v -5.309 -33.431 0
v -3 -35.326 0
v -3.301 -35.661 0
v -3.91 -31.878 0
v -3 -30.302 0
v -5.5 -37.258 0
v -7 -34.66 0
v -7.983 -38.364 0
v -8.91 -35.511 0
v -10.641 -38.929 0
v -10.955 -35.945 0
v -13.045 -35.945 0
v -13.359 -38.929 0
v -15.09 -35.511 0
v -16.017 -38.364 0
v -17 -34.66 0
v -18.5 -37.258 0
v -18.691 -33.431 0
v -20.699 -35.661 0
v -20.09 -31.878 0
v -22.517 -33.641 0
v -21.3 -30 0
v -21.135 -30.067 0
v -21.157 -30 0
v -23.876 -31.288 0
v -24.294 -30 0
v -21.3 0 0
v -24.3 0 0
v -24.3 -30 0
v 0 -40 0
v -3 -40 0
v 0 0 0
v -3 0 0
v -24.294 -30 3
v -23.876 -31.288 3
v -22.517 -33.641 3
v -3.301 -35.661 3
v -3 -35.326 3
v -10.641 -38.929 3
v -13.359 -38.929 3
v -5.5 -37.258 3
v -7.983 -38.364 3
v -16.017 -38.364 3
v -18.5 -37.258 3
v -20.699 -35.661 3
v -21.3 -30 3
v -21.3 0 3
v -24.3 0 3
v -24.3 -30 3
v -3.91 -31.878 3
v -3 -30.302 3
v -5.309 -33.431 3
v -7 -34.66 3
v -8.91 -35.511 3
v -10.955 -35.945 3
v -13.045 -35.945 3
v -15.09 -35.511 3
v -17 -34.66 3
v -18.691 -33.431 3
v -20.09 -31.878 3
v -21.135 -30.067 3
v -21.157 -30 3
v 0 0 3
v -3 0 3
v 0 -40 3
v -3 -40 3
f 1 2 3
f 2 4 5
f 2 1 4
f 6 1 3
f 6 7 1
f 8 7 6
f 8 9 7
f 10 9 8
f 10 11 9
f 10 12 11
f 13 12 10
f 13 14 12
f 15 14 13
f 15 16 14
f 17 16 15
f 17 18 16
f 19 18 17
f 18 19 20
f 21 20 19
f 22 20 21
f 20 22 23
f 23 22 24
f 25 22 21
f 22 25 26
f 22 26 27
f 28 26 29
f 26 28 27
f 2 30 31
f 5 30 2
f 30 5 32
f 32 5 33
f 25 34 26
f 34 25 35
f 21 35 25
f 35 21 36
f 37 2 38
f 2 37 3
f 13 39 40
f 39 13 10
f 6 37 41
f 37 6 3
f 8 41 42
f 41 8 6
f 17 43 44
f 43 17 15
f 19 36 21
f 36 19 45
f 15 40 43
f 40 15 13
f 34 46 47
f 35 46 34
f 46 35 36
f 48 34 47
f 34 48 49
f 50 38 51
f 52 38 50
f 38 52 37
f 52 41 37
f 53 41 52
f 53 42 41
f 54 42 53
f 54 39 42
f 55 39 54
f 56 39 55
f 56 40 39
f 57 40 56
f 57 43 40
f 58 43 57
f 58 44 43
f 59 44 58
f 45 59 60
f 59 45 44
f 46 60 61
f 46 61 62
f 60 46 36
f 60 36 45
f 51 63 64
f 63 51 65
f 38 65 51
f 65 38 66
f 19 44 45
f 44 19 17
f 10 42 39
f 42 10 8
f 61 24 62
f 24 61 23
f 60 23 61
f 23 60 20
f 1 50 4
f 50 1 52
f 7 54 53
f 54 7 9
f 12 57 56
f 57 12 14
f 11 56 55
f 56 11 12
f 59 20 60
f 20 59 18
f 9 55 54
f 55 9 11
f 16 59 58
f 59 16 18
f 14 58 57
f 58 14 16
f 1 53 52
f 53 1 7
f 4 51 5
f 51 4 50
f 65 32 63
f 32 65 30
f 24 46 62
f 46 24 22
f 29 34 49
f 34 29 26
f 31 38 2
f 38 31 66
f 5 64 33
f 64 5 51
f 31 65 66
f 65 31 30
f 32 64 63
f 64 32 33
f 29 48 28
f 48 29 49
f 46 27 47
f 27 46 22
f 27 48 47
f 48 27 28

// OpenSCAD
//u
rotate([0,0,180]){
union(){
cube([3,40,3]);
difference(){  
  translate([12,26,0]) cylinder(3,13,13);
  translate([12,26,-1]) cylinder(5,10,10);
  translate([0,10,-1]) cube([30,20,5]);
  translate([-3,0,-1]) cube([3,40,5]);

}
  translate([21.3,0,0]) cube([3,30,3]);
}
}
